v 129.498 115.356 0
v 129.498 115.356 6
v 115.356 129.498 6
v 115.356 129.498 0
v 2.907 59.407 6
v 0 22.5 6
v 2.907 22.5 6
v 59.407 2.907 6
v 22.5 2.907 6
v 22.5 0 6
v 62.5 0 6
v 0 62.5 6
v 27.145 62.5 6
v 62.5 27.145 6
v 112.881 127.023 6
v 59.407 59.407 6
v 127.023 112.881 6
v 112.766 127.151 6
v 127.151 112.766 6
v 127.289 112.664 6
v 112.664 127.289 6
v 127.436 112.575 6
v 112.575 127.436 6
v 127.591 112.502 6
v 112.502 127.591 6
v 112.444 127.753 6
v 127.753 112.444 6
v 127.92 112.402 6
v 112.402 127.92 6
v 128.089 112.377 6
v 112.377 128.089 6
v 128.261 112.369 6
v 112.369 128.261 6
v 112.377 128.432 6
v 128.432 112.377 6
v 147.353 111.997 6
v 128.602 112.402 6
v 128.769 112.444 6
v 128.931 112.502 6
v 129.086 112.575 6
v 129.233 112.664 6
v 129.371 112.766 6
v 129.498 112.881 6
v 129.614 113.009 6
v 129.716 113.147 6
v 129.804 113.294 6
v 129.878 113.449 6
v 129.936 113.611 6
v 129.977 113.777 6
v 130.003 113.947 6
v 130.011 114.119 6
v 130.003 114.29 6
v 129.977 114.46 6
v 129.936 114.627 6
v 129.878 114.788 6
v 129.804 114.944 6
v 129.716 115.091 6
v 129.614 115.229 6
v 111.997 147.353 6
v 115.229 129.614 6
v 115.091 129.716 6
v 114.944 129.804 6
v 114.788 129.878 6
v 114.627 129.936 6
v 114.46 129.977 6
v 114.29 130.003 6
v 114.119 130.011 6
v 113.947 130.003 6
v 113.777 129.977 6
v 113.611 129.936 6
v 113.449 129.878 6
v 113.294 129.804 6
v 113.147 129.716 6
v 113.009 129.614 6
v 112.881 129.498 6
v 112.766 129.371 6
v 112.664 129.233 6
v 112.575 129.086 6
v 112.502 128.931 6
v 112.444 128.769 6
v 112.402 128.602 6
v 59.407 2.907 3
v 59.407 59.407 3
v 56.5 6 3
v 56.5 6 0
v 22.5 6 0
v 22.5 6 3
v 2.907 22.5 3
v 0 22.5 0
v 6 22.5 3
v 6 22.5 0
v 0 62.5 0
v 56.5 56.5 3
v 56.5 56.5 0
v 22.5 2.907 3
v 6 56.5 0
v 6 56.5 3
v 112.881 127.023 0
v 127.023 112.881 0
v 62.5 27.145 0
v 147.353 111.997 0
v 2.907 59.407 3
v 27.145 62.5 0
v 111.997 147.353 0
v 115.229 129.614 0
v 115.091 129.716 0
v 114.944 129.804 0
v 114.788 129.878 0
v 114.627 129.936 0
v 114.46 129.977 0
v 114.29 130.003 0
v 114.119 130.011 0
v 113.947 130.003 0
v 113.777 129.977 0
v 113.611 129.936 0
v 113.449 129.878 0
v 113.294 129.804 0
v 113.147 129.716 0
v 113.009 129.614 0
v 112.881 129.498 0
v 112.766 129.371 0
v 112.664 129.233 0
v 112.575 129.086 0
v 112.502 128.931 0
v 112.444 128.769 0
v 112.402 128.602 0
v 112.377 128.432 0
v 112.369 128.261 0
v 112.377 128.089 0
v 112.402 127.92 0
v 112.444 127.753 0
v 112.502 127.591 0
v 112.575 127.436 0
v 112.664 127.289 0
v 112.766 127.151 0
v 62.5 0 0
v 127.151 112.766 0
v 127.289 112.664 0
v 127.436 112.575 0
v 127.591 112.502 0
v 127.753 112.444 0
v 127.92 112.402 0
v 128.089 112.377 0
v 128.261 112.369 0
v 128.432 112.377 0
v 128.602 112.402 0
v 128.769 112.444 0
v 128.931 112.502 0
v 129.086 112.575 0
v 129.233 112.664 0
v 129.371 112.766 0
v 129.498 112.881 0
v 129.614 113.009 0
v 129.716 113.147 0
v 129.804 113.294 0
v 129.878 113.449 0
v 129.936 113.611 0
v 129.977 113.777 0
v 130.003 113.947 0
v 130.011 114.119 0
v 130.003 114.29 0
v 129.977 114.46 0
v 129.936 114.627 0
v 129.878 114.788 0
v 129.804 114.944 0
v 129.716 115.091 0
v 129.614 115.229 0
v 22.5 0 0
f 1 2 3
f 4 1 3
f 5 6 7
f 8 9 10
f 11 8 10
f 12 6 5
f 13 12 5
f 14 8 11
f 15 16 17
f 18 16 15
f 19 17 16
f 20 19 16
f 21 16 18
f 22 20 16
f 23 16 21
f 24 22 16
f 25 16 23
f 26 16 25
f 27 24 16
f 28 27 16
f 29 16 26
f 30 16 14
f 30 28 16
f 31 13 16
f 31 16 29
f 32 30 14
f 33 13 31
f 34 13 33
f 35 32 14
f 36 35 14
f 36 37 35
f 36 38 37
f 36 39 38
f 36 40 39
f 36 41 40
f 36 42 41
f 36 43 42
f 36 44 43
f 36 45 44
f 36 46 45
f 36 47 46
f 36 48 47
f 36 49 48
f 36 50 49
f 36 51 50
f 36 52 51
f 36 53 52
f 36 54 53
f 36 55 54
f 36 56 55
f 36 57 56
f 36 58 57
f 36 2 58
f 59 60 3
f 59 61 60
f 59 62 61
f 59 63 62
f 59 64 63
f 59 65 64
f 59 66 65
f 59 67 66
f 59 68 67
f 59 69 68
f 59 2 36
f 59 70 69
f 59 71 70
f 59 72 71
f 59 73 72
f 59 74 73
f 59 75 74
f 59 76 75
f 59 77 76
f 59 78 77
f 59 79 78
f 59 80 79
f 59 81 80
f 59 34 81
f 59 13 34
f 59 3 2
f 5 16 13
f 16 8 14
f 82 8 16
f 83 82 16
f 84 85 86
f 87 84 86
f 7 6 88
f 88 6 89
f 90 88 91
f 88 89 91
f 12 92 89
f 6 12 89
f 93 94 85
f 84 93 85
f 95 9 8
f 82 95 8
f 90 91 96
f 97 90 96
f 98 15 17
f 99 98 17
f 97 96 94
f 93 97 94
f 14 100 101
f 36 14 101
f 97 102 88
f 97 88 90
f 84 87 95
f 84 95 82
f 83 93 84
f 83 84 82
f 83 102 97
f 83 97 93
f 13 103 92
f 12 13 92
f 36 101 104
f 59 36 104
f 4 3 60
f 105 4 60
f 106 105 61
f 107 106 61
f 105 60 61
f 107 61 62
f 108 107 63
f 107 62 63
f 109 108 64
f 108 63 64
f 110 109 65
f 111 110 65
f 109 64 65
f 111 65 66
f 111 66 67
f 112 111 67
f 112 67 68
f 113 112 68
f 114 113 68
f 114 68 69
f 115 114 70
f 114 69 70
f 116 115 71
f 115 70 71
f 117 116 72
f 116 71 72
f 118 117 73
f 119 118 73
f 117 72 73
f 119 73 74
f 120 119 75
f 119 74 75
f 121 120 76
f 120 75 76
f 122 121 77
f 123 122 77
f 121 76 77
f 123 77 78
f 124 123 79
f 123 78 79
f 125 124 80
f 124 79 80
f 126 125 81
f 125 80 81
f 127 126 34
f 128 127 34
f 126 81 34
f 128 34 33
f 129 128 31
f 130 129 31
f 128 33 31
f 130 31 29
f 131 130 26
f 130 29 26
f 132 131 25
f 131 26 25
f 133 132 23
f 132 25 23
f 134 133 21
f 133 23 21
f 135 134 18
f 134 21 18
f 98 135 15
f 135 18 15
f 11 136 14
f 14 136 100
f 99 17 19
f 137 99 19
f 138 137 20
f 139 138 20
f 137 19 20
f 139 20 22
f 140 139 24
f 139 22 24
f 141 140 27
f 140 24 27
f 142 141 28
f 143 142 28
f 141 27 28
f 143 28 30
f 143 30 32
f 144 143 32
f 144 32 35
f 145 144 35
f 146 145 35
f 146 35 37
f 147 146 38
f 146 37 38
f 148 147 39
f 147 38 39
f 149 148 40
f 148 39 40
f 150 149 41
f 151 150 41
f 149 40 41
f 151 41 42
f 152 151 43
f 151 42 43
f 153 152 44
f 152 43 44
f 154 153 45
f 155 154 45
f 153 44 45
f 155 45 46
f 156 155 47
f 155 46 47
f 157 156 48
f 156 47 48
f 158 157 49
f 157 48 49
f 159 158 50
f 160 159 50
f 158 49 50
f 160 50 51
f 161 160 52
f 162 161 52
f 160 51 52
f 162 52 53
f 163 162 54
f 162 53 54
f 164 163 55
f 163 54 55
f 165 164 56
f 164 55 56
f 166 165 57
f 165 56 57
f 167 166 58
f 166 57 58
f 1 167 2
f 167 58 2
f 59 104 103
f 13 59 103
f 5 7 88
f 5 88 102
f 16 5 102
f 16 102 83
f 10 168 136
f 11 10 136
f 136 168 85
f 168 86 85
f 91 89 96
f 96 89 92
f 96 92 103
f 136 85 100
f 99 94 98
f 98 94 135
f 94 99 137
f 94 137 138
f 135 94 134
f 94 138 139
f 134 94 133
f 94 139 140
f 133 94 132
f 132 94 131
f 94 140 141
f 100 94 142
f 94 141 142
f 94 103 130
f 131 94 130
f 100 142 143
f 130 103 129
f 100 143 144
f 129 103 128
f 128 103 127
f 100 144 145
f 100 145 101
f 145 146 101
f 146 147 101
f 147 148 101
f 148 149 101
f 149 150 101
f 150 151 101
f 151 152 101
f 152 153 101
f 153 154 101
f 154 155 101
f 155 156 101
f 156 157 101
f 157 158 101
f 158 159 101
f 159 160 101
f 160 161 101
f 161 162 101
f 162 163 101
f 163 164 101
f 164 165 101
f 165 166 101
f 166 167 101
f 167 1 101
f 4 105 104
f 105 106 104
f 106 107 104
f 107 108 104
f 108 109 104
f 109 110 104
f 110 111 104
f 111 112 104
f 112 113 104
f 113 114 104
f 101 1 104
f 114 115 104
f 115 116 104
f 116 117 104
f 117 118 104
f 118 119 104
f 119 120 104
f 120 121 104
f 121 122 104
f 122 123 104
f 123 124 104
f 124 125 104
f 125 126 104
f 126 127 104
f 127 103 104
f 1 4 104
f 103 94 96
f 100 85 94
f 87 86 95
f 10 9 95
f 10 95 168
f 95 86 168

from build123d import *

# Parameters (mm, degrees)
EXTRUDE_1_DEPTH     = 6
SKETCH_2_W          = 56.5
SKETCH_2_H          = 56.5
CUT_EXTRUDE_1_DEPTH = 3
CUT_EXTRUDE_2_DEPTH = 6


with BuildPart() as part:
    # 草图1 → 凸台-拉伸1 (new body)
    with BuildSketch(Plane.XY):
        Polygon((22.5, 0), (62.5, 0), (62.5, 27.144660941), (147.352813742, 111.997474683), (111.997474683, 147.352813742), (27.144660941, 62.5), (0, 62.5), (0, 22.5), (6, 22.5), (6, 56.5), (56.5, 56.5), (56.5, 6), (22.5, 6), align=None)
    extrude(amount=EXTRUDE_1_DEPTH)

    # 草图2 → 切除-拉伸1 (cut)
    with BuildSketch(Plane.XY.offset(6)):
        with Locations((31.156538063, 31.156538063)):
            Rectangle(SKETCH_2_W, SKETCH_2_H)
    extrude(amount=-CUT_EXTRUDE_1_DEPTH, mode=Mode.SUBTRACT)

    # 草图3 → 切除-拉伸2 (cut)
    with BuildSketch(Plane.XY.offset(6)):
        with BuildLine():
            Line((112.88135816, 127.023493783), (127.023493783, 112.88135816))
            ThreePointArc((127.023493783, 112.88135816), (129.498367517, 112.88135816), (129.498367517, 115.356231894))
            Line((129.498367517, 115.356231894), (115.356231894, 129.498367517))
            ThreePointArc((115.356231894, 129.498367517), (112.88135816, 129.498367517), (112.88135816, 127.023493783))
        make_face()
    extrude(amount=-CUT_EXTRUDE_2_DEPTH, mode=Mode.SUBTRACT)


solid = part.part
